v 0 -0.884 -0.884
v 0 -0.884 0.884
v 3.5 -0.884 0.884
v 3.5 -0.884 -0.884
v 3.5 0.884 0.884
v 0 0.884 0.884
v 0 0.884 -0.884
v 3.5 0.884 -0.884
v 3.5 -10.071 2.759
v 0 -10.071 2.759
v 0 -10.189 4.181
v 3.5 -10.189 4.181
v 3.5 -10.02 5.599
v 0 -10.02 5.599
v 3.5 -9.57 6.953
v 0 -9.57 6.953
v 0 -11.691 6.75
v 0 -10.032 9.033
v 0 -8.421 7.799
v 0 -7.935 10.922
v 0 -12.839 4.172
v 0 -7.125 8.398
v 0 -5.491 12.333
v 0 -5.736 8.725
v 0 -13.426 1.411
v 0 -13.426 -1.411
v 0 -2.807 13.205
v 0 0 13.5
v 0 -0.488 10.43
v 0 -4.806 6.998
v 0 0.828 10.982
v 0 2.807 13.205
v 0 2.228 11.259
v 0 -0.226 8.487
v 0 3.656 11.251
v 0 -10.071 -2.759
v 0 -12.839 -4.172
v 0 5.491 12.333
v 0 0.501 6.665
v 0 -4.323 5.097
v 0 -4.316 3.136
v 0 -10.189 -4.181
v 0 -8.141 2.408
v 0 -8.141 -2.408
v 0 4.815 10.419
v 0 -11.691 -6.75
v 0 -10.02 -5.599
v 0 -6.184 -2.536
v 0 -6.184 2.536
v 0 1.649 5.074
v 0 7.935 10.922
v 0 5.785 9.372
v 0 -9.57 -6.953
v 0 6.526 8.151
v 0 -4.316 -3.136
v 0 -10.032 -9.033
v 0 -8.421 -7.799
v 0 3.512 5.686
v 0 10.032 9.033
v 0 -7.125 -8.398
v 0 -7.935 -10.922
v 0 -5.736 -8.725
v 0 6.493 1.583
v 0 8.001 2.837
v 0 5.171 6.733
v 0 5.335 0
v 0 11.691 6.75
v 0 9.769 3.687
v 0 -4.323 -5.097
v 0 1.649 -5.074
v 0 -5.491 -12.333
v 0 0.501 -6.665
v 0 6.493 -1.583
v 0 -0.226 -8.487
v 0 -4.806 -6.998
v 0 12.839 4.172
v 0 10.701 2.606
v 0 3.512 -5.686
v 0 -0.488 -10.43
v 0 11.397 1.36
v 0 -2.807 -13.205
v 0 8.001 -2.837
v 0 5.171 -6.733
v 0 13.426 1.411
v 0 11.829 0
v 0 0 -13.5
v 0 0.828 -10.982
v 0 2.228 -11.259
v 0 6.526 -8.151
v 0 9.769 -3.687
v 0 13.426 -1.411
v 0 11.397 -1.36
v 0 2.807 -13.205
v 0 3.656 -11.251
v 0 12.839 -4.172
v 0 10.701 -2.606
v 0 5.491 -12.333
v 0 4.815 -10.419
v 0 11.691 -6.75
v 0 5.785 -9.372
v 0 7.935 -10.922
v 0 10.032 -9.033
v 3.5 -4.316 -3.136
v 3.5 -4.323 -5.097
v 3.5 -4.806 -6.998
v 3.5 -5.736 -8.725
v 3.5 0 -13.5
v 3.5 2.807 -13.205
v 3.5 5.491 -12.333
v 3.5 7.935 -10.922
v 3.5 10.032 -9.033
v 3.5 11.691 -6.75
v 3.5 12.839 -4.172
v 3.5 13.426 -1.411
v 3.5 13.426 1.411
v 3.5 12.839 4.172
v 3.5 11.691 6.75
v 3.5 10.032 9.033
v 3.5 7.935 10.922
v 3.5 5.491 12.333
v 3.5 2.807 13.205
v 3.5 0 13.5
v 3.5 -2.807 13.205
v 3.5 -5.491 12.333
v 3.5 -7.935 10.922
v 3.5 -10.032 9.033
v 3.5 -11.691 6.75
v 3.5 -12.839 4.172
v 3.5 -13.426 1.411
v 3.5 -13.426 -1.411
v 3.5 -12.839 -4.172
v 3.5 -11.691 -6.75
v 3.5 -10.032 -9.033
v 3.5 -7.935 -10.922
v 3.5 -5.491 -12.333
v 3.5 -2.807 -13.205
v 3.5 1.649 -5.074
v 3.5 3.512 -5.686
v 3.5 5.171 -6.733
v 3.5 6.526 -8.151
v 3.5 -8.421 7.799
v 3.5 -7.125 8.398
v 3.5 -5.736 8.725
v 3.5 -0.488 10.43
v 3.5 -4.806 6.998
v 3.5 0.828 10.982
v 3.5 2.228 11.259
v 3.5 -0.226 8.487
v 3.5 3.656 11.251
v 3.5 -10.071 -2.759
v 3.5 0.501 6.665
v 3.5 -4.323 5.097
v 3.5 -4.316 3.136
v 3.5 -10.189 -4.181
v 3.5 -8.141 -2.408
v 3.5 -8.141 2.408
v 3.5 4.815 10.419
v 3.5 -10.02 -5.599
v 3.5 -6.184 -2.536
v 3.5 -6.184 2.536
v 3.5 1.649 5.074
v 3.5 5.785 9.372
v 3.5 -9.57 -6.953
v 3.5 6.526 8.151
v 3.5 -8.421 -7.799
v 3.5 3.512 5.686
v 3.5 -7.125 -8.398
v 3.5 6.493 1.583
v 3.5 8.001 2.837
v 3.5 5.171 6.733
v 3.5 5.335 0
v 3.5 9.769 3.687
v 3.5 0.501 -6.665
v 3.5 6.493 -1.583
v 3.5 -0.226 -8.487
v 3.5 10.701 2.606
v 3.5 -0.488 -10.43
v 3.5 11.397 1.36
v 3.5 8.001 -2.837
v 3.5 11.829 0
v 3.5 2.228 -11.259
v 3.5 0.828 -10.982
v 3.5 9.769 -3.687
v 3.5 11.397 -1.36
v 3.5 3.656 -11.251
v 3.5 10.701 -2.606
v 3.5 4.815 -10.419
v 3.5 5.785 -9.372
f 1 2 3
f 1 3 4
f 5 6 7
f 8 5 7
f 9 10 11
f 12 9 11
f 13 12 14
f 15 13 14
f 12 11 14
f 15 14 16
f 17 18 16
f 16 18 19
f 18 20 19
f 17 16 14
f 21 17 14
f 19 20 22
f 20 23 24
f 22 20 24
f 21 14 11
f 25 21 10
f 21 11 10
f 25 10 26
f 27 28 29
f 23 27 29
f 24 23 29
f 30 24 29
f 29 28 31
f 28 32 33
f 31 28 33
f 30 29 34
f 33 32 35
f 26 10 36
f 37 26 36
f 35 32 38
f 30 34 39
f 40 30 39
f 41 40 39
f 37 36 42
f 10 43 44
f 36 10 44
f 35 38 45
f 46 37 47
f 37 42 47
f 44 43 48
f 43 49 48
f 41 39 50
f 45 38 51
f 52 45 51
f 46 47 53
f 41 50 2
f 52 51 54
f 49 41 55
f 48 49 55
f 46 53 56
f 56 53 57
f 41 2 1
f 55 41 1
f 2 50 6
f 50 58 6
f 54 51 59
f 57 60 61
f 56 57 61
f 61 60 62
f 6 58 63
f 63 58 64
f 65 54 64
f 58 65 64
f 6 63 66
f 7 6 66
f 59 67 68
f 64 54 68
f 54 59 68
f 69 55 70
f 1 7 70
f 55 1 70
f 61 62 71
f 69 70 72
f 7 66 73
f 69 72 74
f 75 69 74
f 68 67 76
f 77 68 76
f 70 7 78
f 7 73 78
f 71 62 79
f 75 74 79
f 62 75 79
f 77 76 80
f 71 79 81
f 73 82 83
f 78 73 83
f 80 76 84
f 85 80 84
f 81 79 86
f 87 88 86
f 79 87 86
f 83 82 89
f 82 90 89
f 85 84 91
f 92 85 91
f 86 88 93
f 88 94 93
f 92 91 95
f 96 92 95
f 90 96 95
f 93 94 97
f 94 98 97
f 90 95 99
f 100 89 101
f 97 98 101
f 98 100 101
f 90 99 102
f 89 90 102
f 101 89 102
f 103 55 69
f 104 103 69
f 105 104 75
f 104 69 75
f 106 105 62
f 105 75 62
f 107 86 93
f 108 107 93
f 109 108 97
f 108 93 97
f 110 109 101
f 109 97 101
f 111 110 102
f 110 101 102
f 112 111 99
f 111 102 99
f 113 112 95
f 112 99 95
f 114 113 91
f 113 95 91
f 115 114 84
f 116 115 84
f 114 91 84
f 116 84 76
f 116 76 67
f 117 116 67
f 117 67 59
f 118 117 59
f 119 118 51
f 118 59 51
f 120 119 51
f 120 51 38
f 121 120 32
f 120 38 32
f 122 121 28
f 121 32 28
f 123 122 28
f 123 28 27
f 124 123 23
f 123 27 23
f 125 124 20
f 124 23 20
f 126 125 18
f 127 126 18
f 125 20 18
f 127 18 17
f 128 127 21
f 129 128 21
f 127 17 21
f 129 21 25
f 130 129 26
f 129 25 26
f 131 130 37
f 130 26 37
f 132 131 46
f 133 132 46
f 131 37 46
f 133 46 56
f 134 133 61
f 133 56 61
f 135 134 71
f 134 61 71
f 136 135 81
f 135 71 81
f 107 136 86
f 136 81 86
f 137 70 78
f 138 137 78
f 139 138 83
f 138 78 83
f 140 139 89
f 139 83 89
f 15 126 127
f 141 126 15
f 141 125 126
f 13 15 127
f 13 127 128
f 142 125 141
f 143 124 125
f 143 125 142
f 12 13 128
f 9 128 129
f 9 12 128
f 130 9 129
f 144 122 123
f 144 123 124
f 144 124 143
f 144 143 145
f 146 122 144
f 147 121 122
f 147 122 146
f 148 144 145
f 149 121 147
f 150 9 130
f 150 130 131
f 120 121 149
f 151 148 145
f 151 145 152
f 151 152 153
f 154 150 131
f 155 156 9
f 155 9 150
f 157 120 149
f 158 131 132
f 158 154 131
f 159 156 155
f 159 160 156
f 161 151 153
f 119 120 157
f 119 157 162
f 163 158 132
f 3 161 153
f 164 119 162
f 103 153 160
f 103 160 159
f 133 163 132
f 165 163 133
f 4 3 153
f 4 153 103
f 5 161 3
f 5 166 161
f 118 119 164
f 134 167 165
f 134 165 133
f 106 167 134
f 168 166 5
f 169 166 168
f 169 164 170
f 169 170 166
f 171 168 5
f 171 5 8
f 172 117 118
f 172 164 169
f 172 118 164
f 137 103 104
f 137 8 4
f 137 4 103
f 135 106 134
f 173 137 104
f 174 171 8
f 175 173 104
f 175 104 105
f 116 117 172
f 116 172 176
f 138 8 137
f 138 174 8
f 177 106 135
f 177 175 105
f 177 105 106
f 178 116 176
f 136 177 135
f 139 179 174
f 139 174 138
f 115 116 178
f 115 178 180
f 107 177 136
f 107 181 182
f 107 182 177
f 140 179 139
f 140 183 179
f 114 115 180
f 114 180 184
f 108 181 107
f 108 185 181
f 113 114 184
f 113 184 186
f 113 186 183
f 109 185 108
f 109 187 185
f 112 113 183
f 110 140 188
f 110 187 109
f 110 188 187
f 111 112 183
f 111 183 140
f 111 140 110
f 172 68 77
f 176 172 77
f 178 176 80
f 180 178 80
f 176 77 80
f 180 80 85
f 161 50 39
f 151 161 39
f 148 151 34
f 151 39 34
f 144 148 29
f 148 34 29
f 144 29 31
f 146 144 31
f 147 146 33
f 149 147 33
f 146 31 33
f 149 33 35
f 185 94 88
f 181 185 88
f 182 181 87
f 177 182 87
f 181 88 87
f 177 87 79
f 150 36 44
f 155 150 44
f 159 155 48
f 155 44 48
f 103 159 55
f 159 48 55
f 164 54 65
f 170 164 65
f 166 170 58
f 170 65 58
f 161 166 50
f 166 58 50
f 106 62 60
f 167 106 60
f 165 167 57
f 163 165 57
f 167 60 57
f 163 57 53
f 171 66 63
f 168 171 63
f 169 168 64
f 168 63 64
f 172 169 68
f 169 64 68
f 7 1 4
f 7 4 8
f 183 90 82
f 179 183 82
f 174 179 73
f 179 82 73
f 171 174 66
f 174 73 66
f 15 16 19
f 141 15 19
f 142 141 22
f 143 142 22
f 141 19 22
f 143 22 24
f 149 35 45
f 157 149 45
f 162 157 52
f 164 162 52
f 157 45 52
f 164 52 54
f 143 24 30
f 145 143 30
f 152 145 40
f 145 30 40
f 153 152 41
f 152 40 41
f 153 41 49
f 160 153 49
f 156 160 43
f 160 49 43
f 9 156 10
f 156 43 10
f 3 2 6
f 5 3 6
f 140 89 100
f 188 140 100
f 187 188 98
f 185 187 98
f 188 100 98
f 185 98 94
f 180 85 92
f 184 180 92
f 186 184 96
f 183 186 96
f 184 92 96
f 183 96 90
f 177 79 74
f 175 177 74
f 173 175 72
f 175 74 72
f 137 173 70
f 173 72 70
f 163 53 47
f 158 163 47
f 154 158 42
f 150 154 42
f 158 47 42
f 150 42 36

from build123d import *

# Parameters (mm, degrees)
SKETCH1_R           = 13.5
BOSS_EXTRUDE1_DEPTH = 3.5
CUT_EXTRUDE1_REACH  = 21.41
CIRPATTERN1_COUNT   = 5
CUT_EXTRUDE2_REACH  = 21.41
SKETCH3_W           = 1.767766952
SKETCH3_H           = 1.767766952


with BuildPart() as part:
    # Sketch1 → Boss-Extrude1 (new body)
    with BuildSketch(Plane(origin=(0, 0, 0), x_dir=(0, 0, -1), z_dir=(1, 0, 0))):
        Circle(SKETCH1_R)
    extrude(amount=BOSS_EXTRUDE1_DEPTH)

    # Sketch2 → Cut-Extrude1 (cut, up to next)
    with BuildSketch(Plane(origin=(0, 0, 0), x_dir=(0, 0, -1), z_dir=(1, 0, 0)), mode=Mode.PRIVATE) as cut_extrude1_sk1:
        with BuildLine():
            ThreePointArc((0, 5.335224169), (-2.256377168, 7.208861271), (-3.687303072, 9.768979428))
            ThreePointArc((-3.687303072, 9.768979428), (-2.000654027, 11.080188439), (0, 11.829479796))
            ThreePointArc((0, 11.829479796), (2.000654027, 11.080188439), (3.687303072, 9.768979428))
            ThreePointArc((3.687303072, 9.768979428), (2.256377168, 7.208861271), (0, 5.335224169))
        make_face()
    cut_extrude1_tool1 = extrude(cut_extrude1_sk1.sketch, amount=CUT_EXTRUDE1_REACH, mode=Mode.PRIVATE) & part.part
    cut_extrude1 = cut_extrude1_tool1.solids().sort_by_distance((0, 8.878443, 0))[0]
    add(cut_extrude1, mode=Mode.SUBTRACT)

    # CirPattern1: Cut-Extrude1 ×5 about axis
    cirpattern1_axis = Axis((0, 0, 0), (1, 0, 0))
    for i in range(1, CIRPATTERN1_COUNT):
        add(cut_extrude1.rotate(cirpattern1_axis, i * 360 / CIRPATTERN1_COUNT), mode=Mode.SUBTRACT)

    # Sketch3 → Cut-Extrude2 (cut, up to next)
    with BuildSketch(Plane(origin=(0, 0, 0), x_dir=(0, 0, -1), z_dir=(1, 0, 0)), mode=Mode.PRIVATE) as cut_extrude2_sk1:
        Rectangle(SKETCH3_W, SKETCH3_H)
    cut_extrude2_tool1 = extrude(cut_extrude2_sk1.sketch, amount=CUT_EXTRUDE2_REACH, mode=Mode.PRIVATE) & part.part
    add(cut_extrude2_tool1.solids().sort_by_distance((0, 0, 0))[0], mode=Mode.SUBTRACT)


solid = part.part
